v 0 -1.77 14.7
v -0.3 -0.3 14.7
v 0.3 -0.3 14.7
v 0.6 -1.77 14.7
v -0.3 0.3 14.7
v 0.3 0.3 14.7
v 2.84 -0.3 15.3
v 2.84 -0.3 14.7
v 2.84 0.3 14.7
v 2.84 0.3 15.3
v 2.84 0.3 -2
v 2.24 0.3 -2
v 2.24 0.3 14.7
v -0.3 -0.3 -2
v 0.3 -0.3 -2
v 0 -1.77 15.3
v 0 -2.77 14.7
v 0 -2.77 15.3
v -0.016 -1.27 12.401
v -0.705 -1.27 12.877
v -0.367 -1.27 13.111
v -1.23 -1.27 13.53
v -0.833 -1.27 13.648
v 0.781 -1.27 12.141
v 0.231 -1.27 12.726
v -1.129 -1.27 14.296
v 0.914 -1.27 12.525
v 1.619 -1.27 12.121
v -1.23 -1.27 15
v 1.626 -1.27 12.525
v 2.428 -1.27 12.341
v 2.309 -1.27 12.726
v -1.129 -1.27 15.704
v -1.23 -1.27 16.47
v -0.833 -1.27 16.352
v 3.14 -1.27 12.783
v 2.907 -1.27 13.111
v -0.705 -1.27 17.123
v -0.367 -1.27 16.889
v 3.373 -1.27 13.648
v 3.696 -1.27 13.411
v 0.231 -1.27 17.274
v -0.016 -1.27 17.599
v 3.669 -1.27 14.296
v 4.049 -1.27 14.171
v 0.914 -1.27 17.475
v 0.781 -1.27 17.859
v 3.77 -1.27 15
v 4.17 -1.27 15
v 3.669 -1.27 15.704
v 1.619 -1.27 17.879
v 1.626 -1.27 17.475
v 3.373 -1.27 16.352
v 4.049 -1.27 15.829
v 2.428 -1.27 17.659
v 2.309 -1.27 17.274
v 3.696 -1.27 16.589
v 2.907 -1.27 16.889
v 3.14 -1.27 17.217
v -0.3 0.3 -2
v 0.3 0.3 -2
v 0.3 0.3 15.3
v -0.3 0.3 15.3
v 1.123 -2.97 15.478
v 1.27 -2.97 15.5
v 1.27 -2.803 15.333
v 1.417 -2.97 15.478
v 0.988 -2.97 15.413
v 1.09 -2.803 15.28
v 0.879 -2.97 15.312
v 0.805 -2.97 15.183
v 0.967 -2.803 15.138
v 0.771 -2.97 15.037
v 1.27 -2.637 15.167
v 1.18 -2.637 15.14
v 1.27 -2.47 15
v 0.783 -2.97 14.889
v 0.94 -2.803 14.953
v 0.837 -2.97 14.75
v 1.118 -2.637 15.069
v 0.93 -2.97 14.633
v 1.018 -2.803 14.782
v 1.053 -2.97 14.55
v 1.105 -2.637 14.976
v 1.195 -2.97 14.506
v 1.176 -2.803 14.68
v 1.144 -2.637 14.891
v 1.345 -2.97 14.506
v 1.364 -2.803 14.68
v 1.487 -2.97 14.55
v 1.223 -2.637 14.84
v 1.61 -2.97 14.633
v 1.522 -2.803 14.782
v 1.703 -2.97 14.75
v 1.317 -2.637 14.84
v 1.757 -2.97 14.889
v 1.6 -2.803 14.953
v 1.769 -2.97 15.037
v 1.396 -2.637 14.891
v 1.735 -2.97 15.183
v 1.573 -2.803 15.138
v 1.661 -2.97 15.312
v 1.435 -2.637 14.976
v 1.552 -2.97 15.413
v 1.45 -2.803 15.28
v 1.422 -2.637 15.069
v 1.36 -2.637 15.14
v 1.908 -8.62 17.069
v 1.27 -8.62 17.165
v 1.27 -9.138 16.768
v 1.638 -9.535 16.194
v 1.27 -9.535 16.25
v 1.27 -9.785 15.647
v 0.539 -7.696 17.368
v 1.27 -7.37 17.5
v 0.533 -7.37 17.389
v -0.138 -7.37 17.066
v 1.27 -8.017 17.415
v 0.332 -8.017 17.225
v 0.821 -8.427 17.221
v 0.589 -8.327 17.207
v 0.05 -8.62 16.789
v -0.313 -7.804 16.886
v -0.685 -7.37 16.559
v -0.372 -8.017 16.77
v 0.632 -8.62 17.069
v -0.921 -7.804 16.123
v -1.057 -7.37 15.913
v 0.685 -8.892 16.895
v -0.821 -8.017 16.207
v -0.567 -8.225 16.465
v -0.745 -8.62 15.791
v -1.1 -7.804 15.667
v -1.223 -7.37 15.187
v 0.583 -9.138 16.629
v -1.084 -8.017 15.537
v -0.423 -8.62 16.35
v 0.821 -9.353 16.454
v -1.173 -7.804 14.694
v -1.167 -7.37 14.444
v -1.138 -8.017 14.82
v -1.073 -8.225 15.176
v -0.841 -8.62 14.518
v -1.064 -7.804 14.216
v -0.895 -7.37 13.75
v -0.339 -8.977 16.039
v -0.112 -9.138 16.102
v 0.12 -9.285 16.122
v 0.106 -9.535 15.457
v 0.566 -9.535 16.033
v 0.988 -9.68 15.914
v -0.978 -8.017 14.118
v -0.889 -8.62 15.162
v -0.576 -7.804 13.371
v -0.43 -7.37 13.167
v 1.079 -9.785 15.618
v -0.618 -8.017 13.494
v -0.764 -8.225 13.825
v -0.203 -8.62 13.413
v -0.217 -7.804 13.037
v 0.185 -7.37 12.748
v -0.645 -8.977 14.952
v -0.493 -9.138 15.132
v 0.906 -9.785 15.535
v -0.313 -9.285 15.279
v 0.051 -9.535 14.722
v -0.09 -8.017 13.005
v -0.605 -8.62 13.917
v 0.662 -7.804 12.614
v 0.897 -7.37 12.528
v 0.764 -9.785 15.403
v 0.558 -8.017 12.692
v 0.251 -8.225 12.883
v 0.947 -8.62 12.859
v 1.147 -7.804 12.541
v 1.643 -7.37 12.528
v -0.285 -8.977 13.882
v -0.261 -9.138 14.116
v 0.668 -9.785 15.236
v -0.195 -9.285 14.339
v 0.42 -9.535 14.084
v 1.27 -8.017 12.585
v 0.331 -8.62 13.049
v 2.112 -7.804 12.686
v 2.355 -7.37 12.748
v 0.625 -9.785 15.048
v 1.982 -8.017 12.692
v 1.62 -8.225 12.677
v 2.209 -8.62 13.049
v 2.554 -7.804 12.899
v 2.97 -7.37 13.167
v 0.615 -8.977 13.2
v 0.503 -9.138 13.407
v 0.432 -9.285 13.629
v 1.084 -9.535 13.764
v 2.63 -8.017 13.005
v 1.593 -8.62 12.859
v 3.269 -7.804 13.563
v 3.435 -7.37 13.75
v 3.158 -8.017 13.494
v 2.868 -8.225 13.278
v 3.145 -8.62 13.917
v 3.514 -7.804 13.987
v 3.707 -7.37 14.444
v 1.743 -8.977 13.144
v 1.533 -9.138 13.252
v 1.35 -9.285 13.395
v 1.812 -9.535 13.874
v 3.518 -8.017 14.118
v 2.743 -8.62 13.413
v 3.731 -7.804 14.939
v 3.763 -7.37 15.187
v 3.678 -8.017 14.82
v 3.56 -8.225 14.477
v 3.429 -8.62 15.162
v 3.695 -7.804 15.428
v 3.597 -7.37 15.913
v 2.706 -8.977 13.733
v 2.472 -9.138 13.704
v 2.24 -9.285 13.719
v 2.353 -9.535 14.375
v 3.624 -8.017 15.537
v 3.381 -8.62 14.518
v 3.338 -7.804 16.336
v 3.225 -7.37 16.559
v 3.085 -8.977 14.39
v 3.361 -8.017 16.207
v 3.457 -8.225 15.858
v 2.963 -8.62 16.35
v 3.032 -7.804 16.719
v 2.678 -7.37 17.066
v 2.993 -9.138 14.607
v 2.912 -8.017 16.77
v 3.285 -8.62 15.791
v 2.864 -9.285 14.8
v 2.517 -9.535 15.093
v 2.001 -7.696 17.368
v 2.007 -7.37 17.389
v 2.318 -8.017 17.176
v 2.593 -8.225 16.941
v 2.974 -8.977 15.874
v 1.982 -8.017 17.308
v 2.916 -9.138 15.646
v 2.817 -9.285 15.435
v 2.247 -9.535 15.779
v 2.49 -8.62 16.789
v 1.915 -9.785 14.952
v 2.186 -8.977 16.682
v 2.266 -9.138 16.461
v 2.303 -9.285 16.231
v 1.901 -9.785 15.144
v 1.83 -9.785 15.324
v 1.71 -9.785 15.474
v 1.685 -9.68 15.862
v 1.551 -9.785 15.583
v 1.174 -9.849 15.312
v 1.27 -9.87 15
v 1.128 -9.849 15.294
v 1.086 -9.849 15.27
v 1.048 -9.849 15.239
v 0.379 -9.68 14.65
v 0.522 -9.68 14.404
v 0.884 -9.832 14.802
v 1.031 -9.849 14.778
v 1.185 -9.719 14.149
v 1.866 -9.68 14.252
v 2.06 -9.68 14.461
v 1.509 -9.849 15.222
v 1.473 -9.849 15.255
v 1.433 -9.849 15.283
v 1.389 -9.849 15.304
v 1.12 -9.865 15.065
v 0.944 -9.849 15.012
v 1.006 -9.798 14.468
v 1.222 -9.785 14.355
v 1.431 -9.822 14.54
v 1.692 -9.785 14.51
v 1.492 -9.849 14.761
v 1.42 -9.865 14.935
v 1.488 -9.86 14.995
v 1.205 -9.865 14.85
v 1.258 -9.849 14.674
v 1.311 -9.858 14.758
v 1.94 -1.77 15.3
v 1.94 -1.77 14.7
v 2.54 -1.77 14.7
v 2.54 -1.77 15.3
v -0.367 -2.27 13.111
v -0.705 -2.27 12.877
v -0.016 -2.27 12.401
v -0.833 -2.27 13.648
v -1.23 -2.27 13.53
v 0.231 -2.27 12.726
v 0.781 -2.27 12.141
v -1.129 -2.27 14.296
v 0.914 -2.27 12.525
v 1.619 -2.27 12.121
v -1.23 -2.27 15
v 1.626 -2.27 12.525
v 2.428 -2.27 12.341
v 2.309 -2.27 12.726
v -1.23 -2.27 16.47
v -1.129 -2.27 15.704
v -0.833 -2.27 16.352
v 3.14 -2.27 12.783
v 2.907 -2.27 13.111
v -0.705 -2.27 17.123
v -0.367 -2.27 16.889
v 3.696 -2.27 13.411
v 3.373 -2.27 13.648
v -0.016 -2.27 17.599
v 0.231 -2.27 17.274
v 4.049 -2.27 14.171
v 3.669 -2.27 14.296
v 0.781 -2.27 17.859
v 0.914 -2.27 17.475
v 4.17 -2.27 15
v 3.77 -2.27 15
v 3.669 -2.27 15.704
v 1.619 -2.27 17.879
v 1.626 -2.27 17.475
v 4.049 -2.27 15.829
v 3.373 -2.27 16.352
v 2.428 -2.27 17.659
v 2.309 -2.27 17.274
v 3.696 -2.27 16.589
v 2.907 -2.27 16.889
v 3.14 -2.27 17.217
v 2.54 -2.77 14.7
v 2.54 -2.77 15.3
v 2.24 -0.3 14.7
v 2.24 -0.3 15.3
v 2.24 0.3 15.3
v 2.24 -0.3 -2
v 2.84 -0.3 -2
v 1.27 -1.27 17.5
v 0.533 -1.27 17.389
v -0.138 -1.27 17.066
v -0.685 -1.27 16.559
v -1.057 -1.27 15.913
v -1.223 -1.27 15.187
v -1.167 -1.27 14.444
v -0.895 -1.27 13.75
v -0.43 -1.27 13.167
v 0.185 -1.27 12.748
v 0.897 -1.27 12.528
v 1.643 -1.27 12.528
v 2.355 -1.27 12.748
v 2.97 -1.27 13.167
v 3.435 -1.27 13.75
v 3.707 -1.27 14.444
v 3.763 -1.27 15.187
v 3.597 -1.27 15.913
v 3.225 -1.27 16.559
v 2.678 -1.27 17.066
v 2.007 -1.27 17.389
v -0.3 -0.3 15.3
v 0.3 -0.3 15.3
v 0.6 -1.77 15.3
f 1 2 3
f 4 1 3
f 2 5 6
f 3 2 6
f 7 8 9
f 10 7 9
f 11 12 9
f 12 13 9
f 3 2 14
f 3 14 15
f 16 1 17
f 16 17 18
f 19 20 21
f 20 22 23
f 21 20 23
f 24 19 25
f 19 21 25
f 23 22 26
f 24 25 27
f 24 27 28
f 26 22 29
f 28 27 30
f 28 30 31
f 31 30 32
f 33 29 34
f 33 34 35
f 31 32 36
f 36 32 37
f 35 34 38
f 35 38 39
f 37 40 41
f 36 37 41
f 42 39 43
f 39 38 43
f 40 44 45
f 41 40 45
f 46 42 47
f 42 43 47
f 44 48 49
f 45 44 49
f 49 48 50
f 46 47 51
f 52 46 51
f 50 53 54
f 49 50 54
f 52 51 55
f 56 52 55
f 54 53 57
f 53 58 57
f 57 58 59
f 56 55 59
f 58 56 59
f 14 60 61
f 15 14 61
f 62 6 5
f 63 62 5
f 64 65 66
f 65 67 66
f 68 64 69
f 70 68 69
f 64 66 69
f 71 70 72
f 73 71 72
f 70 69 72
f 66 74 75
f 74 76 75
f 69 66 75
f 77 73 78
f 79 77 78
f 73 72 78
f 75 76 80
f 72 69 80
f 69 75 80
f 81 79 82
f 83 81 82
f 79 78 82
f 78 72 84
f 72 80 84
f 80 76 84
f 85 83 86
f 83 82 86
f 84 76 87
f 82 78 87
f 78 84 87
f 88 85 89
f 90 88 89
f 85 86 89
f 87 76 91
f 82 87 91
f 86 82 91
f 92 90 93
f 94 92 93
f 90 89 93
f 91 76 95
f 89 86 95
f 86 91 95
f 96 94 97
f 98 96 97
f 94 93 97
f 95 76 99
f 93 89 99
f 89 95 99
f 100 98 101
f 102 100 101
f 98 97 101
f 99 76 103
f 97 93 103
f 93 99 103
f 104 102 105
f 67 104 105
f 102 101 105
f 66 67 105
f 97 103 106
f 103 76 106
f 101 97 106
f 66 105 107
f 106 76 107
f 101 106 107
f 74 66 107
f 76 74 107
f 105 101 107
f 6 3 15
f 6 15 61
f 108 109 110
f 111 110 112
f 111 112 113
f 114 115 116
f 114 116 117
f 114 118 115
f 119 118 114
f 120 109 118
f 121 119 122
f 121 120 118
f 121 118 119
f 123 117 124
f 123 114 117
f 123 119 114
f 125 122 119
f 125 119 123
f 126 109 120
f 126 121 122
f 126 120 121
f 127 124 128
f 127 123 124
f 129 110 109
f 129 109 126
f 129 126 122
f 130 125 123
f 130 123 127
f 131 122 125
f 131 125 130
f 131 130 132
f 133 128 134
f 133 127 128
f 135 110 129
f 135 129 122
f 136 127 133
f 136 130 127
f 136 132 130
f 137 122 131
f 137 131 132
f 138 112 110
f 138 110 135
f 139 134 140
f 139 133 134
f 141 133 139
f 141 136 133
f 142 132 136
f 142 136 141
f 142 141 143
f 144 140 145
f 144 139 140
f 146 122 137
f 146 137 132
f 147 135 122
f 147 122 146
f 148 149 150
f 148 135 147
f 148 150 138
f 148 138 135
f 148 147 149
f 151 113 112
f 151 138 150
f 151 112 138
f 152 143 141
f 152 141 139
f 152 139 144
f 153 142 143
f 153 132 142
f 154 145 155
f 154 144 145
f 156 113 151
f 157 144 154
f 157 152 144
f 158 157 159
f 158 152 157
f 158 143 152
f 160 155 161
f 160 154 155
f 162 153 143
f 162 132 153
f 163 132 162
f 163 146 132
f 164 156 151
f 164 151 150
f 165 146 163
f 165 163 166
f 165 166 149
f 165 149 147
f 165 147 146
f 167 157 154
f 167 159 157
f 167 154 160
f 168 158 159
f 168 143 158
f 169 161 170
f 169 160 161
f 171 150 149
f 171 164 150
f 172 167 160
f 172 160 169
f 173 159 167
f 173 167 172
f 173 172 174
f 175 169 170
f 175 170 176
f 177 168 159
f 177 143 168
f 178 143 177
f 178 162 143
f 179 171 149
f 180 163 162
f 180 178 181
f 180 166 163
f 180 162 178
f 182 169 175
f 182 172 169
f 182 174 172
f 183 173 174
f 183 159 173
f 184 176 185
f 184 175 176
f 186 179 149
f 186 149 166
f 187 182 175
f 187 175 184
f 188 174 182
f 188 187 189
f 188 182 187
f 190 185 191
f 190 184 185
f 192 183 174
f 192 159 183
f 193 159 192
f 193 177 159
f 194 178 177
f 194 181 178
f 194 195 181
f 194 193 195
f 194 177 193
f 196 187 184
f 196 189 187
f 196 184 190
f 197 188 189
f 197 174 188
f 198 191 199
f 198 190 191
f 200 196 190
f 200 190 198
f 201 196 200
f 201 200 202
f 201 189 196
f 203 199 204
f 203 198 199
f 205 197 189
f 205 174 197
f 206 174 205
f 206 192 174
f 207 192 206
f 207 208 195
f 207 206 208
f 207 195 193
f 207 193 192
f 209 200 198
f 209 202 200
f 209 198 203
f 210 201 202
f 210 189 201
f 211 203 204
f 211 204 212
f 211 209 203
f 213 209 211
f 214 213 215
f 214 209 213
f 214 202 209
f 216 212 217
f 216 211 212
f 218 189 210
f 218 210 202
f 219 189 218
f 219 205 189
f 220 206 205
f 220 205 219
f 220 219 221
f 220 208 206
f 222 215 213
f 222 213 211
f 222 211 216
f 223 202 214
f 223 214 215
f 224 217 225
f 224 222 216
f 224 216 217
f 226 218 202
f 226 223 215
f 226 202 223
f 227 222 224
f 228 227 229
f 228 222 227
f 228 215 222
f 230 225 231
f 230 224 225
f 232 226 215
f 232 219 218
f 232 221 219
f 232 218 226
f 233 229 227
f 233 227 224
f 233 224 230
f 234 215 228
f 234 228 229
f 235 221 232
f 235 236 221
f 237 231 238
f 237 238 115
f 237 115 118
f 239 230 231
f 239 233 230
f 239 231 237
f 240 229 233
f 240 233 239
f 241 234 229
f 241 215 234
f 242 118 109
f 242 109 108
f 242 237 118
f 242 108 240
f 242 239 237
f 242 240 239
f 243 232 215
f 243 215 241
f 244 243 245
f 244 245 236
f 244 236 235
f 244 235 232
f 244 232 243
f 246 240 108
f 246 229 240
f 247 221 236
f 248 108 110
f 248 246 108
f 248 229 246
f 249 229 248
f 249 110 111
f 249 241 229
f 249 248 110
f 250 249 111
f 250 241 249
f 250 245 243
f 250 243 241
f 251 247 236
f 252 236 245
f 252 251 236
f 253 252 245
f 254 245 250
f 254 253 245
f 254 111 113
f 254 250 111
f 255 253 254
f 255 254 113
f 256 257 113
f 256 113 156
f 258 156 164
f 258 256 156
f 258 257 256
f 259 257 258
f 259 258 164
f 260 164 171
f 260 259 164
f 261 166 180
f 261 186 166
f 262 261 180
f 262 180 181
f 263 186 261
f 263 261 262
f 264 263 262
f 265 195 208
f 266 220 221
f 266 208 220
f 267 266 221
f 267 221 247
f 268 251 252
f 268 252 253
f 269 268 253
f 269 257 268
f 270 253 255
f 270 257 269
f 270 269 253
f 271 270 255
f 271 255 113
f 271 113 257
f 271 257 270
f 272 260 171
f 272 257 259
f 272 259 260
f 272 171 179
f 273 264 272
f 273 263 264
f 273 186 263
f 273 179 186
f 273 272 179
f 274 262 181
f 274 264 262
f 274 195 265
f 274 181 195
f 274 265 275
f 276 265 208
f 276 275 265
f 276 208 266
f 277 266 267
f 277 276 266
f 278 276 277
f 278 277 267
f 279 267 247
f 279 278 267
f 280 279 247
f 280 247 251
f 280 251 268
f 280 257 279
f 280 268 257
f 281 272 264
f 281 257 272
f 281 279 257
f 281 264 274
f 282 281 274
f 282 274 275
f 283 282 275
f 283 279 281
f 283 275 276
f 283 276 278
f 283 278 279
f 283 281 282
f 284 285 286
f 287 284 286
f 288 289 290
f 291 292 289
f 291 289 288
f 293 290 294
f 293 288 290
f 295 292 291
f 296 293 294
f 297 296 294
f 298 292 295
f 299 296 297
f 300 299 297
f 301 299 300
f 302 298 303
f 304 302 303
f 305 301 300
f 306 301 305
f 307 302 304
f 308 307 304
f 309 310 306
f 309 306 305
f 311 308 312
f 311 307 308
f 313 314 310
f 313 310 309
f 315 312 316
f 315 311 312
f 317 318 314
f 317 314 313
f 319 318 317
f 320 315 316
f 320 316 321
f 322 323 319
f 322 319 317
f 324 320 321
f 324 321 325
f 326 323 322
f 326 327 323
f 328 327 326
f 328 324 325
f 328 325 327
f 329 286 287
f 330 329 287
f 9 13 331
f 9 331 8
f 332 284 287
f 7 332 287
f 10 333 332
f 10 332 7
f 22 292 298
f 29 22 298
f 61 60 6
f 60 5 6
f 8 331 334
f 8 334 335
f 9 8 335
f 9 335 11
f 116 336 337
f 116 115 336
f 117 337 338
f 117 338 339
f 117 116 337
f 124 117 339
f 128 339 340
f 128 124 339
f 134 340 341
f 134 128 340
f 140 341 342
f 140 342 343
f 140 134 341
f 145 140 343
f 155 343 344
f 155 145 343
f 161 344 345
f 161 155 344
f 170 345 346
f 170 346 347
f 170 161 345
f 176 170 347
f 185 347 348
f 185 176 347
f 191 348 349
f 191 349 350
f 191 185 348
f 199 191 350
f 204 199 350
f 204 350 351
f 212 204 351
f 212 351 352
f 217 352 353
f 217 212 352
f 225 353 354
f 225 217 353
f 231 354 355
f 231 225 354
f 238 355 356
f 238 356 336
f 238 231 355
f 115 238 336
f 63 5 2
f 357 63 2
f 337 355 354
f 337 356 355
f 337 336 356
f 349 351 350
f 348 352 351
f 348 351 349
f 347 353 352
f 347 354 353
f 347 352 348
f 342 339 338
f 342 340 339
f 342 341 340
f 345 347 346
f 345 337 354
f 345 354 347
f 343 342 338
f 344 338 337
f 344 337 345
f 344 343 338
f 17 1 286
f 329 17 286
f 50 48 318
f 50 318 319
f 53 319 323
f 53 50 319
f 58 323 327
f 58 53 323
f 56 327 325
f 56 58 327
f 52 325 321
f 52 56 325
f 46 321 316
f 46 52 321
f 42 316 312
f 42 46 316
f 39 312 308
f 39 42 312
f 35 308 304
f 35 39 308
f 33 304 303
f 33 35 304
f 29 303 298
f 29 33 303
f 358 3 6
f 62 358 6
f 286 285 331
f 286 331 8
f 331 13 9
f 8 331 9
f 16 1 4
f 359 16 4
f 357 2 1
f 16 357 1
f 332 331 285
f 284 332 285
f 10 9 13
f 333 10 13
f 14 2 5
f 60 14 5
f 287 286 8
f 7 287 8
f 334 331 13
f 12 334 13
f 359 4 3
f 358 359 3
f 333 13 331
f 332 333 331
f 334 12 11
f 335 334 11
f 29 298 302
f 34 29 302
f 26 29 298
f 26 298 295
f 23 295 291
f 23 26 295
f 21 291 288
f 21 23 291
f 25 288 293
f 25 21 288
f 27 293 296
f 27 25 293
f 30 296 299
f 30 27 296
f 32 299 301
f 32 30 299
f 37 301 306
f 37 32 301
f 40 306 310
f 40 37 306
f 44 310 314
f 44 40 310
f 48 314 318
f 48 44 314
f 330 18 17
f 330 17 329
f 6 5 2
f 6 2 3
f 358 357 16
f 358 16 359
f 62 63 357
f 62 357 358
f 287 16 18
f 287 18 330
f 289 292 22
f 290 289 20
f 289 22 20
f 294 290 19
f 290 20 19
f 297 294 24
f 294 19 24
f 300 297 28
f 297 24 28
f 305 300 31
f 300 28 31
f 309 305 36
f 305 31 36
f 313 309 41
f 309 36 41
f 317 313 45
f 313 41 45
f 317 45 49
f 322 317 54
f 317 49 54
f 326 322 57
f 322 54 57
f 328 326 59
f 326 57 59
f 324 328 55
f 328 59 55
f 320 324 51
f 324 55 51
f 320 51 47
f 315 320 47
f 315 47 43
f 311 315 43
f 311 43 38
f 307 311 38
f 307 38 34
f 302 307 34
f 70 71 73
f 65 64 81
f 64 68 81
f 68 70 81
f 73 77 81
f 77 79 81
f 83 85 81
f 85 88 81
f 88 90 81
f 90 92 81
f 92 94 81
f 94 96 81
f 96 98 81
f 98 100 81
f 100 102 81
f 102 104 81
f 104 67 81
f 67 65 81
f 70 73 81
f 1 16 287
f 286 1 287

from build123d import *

# Parameters (mm, degrees)
SKETCH_W       = 0.6
SKETCH_H       = 0.6
PAD_DEPTH      = 14.7
PAD_DEPTH_BACK = 2
PAD001_DEPTH   = 0.6
SKETCH002_W    = 2.54
SKETCH002_H    = 0.6
PAD002_DEPTH   = 1
SKETCH004_R    = 2.9
SKETCH004_R_2  = 2.5
PAD003_DEPTH   = 1
SKETCH006_W    = 0.4
SKETCH006_H    = 5.8
POCKET_DEPTH   = 1.001


with BuildPart() as pad:
    # Sketch → Pad (new body, two sides)
    with BuildSketch(Plane.XY) as pad_sk:
        Rectangle(SKETCH_W, SKETCH_H)
        with Locations((2.54, 0)):
            Rectangle(SKETCH_W, SKETCH_H)
    extrude(amount=PAD_DEPTH)
    extrude(pad_sk.sketch, amount=-PAD_DEPTH_BACK)


with BuildPart() as pad001:
    # Sketch001 → Pad001 (new body)
    with BuildSketch(Plane.XY.offset(14.7)):
        Polygon((0.3, 0.3), (-0.3, 0.3), (-0.3, -0.3), (0, -1.77), (0.6, -1.77), (0.3, -0.3), align=None)
        Polygon((2.84, 0.3), (2.24, 0.3), (2.24, -0.3), (1.94, -1.77), (2.54, -1.77), (2.84, -0.3), align=None)
    extrude(amount=PAD001_DEPTH)


with BuildPart() as pad002:
    # Sketch002 → Pad002 (new body)
    with BuildSketch(Plane.XZ.offset(1.77)):
        with Locations((1.27, 15)):
            Rectangle(SKETCH002_W, SKETCH002_H)
    extrude(amount=PAD002_DEPTH)


with BuildPart() as revolution:
    # Sketch003 → Revolution (revolve)
    with BuildSketch(Plane.YZ.offset(1.27)):
        with BuildLine():
            Line((-1.27, 15), (-9.87, 15))
            ThreePointArc((-7.37, 17.5), (-9.137767, 16.767767), (-9.87, 15))
            Line((-1.27, 17.5), (-7.37, 17.5))
            Line((-1.27, 15), (-1.27, 17.5))
        make_face()
    revolve(axis=Axis((1.27, -5.810397, 15), (0, -1, 0)))


with BuildPart() as revolution001:
    # Sketch005 → Revolution001 (revolve)
    with BuildSketch(Plane.YZ.offset(1.27)):
        Polygon((-2.47, 15), (-2.97, 15), (-2.97, 15.5), align=None)
    revolve(axis=Axis((1.27, -3.977201, 15), (0, -1, 0)))


with BuildPart() as pocket:
    # Sketch004 → Pad003 (new body)
    with BuildSketch(Plane.XZ.offset(1.27)):
        with Locations((1.27, 15)):
            Circle(SKETCH004_R)
        with Locations((1.27, 15)):
            Circle(SKETCH004_R_2, mode=Mode.SUBTRACT)
    extrude(amount=PAD003_DEPTH)

    # Sketch006 → Pocket (cut, through all)
    with BuildSketch(Plane.XZ.offset(2.27)):
        with Locations((-1.43, 15)):
            Rectangle(SKETCH006_W, SKETCH006_H)
    extrude(amount=-POCKET_DEPTH, mode=Mode.SUBTRACT)


solid = Compound([pad.part, pad001.part, pad002.part, revolution.part, revolution001.part, pocket.part])
